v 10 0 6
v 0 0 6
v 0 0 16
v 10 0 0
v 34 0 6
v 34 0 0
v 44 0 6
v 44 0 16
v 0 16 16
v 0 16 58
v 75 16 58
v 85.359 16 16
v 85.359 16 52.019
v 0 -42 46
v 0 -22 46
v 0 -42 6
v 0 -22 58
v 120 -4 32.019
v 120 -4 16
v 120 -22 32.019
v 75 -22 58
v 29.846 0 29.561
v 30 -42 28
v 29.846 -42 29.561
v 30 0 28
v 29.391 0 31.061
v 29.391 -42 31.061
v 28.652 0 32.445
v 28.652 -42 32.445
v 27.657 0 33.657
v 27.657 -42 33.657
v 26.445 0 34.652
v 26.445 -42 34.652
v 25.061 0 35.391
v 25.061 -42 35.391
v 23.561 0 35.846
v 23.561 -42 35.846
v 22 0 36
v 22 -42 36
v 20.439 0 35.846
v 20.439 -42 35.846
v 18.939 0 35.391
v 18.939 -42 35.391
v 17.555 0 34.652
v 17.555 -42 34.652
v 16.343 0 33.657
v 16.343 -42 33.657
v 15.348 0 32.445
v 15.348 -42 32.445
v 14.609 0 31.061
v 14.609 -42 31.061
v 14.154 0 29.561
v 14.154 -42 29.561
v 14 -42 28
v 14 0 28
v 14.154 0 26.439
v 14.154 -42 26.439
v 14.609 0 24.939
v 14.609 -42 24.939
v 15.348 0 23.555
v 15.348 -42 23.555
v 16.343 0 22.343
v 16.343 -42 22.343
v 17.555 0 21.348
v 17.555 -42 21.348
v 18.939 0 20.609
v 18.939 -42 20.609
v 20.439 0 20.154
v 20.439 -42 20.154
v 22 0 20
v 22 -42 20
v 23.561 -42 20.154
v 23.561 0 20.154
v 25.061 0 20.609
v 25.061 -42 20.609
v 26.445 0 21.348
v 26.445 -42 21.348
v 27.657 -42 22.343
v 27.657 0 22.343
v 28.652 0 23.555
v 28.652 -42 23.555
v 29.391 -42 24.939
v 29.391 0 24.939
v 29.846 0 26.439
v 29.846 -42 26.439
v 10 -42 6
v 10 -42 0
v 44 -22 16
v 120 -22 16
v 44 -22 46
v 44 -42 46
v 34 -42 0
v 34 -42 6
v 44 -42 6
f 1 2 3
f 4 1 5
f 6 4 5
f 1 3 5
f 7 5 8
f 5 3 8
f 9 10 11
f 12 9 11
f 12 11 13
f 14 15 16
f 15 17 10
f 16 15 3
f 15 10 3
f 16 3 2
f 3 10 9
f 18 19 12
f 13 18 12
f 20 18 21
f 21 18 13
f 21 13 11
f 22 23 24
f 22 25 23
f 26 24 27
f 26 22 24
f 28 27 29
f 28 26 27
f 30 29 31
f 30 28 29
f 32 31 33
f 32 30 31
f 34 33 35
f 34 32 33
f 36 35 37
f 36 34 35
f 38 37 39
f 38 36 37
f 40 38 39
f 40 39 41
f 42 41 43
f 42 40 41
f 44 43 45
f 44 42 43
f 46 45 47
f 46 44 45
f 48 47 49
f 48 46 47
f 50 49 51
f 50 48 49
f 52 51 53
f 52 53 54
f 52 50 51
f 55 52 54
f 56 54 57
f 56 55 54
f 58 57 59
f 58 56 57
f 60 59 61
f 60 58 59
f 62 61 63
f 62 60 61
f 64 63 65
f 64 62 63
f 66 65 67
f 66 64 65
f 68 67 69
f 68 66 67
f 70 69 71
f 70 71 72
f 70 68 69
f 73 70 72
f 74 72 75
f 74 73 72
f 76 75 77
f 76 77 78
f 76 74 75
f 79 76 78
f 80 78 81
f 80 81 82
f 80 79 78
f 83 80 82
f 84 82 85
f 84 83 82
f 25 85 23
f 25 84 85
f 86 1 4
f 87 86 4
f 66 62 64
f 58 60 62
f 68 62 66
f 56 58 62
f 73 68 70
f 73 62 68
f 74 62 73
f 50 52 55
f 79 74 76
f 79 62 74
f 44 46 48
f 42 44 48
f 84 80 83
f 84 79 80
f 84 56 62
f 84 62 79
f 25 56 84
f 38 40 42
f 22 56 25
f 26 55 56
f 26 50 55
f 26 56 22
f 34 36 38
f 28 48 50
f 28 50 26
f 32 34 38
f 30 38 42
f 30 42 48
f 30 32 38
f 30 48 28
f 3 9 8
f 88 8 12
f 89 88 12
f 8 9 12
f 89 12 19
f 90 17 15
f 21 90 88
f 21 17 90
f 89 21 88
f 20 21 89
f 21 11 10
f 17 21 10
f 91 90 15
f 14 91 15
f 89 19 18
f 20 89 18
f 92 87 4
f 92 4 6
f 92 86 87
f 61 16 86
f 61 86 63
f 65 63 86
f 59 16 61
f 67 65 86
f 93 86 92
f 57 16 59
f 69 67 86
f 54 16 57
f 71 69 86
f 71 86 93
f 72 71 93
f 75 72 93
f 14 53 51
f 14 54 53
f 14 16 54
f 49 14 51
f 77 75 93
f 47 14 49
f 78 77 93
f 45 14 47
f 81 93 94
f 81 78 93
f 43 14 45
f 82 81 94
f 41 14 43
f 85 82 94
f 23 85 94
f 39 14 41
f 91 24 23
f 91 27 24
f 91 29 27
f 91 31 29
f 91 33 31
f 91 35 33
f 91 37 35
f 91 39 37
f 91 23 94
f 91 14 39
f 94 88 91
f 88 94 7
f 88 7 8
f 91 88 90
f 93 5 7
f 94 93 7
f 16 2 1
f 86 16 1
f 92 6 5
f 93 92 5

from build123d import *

# Parameters (mm, degrees)
F0_R     = 8
F3_DEPTH = 42
F4_DEPTH = 38
F5_DEPTH = 22
F7_DEPTH = 42.001


with BuildPart() as f3:
    # F0 (on Front) → F3 (new body)
    with BuildSketch(Plane.XZ):
        Polygon((10, 6), (10, 0), (34, 0), (34, 6), (44, 6), (44, 16), (44, 46), (0, 46), (0, 6), align=None)
        with Locations((22, 28)):
            Circle(F0_R, mode=Mode.SUBTRACT)
    extrude(amount=F3_DEPTH)

    # F2 (on offset) → F4 (join)
    with BuildSketch(Plane.XZ.offset(-16)):
        Polygon((75, 58), (0, 58), (0, 16), (120, 16), (120, 32.0192378865), align=None)
    extrude(amount=F4_DEPTH)

    # F5 (cut): a face of the model
    f5_faces = [f3.faces().sort_by_distance(p)[0] for p in [
        (22, -22, 28),
    ]]
    extrude(f5_faces, amount=-F5_DEPTH, mode=Mode.SUBTRACT)

    # F6 (on face) → F7 (cut, through all)
    with BuildSketch(Plane(origin=(0, 0, 16), x_dir=(1, 0, 0), z_dir=(0, 0, -1))):
        Polygon((120, 4), (85.3589838486, -16), (120, -16), align=None)
    extrude(amount=-F7_DEPTH, mode=Mode.SUBTRACT)


solid = f3.part
